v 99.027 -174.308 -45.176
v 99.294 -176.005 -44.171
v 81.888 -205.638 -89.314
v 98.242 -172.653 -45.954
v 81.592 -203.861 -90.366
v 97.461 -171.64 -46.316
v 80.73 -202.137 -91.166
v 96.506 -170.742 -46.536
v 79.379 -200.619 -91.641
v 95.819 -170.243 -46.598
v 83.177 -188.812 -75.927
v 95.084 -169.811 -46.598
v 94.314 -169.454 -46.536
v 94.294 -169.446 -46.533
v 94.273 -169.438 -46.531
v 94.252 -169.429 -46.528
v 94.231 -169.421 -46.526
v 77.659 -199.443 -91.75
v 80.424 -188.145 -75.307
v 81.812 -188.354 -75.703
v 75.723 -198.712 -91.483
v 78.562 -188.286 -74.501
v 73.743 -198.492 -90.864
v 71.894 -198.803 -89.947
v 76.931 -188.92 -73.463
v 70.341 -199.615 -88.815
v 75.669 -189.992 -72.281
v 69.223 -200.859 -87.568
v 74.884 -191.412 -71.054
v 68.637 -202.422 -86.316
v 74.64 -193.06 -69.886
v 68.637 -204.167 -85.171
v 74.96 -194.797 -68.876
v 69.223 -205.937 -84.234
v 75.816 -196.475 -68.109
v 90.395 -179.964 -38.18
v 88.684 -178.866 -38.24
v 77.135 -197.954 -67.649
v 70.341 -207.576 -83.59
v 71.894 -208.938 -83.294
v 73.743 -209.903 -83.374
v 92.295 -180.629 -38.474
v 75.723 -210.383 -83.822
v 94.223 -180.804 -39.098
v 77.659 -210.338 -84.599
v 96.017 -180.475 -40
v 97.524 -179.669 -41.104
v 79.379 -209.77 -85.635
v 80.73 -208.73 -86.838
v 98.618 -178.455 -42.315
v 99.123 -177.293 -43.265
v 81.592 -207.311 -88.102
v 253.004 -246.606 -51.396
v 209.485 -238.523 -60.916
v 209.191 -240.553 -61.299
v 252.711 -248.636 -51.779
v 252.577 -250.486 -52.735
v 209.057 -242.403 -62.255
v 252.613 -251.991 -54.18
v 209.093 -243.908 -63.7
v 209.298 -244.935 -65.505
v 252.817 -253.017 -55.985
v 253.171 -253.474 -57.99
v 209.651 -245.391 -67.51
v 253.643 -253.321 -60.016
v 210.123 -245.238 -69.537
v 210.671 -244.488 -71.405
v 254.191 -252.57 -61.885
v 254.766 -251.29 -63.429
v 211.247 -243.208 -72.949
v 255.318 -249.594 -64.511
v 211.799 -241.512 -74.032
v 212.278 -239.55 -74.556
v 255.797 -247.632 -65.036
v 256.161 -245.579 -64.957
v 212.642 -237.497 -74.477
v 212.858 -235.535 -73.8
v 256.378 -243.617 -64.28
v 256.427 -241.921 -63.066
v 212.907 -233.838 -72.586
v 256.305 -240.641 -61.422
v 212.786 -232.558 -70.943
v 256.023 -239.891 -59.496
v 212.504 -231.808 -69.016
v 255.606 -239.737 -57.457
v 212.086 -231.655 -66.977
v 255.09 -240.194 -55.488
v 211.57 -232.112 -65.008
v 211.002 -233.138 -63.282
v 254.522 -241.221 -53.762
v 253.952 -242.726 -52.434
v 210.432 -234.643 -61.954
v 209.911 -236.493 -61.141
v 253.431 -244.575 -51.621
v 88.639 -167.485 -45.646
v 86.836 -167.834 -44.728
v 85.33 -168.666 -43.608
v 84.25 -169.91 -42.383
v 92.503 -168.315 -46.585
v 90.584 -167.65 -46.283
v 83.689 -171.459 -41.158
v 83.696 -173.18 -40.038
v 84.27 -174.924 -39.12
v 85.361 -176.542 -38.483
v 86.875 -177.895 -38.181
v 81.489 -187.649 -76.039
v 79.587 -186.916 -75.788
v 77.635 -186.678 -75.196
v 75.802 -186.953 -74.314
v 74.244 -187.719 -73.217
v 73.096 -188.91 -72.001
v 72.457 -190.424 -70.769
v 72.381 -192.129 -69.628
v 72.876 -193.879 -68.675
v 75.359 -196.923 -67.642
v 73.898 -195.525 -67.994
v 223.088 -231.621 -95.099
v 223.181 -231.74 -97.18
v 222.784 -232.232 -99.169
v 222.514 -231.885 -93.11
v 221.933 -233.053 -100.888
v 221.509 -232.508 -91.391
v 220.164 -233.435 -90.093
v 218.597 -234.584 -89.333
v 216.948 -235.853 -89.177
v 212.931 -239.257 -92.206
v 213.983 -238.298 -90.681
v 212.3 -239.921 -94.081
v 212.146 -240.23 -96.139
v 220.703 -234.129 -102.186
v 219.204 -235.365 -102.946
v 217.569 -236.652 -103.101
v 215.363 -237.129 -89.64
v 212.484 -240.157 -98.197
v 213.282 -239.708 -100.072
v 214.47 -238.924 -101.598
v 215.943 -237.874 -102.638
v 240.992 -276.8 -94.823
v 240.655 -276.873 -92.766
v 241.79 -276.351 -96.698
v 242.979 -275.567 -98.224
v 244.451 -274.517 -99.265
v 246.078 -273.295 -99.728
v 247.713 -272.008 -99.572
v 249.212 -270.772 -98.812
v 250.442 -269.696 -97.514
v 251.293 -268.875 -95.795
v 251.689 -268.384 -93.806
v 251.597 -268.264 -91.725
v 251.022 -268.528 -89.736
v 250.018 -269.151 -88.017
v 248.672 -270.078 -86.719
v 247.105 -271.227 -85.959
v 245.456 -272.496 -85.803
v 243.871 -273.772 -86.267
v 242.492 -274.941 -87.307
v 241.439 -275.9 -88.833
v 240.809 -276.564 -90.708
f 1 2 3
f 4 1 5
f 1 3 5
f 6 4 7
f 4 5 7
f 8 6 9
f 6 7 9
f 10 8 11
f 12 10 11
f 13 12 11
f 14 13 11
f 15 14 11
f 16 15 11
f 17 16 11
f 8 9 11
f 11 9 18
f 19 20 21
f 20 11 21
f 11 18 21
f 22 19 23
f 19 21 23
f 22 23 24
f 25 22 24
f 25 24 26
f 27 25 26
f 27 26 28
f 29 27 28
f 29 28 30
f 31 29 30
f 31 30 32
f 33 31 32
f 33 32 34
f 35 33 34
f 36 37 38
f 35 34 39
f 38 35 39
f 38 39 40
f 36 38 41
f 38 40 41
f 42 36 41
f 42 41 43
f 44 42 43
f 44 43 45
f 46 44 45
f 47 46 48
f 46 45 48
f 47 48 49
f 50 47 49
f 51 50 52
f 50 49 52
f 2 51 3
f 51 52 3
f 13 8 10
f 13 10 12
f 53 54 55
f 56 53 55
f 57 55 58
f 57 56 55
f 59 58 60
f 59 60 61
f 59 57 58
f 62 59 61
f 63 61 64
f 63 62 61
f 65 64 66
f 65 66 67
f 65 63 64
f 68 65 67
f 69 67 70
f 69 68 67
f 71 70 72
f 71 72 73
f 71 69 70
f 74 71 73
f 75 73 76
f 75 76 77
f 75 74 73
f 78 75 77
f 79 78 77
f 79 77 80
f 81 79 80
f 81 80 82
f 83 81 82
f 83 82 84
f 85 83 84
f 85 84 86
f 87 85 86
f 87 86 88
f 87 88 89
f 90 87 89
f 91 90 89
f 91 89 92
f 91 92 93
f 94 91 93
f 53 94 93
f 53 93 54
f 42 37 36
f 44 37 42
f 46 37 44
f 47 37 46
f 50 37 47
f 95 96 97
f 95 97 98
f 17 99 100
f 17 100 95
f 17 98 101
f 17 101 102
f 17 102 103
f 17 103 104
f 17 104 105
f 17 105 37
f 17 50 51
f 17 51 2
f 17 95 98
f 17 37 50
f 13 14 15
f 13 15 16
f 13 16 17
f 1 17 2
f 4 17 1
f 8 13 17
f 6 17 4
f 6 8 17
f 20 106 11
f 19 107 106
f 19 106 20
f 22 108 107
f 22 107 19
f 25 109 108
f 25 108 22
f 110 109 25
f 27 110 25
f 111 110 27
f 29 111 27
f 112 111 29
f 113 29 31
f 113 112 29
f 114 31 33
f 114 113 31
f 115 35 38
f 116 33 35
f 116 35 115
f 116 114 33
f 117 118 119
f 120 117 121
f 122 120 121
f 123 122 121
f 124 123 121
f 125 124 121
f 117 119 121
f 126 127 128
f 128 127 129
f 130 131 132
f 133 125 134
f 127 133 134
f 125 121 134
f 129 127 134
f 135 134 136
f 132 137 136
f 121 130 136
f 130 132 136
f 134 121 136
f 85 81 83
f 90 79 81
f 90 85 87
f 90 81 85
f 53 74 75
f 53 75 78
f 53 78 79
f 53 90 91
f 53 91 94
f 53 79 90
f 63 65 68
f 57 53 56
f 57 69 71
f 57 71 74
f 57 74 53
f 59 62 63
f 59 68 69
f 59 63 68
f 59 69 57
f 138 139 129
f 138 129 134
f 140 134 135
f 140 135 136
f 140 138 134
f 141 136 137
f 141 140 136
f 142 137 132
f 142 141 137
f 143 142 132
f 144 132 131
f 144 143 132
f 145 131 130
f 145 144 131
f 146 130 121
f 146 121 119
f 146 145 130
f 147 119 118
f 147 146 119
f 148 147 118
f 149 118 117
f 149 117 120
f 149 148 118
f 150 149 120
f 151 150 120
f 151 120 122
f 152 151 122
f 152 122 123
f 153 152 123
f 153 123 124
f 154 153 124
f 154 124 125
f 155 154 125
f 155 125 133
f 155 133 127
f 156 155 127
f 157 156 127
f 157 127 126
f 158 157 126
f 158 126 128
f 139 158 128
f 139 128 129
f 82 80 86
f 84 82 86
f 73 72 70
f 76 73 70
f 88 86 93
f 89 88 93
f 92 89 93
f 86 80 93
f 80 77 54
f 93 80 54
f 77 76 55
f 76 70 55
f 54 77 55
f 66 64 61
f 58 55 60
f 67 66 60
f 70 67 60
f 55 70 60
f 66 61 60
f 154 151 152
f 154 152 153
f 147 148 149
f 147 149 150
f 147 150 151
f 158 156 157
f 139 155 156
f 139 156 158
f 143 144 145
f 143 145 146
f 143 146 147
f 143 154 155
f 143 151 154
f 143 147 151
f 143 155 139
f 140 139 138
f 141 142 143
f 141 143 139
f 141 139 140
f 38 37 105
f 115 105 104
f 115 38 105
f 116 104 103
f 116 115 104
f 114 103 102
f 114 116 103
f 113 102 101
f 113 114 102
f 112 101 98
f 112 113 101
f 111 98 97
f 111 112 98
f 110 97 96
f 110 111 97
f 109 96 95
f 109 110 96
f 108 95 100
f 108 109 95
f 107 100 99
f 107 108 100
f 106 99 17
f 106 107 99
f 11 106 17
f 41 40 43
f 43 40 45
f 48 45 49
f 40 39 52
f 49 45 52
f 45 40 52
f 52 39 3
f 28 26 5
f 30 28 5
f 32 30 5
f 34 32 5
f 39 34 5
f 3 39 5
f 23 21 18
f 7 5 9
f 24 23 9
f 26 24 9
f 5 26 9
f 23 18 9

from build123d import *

# Parameters (mm, degrees)
SUSP_FR_ROCKER_BRACKET_A_PROFILE_R     = 7
SUSP_FR_ROCKER_BRACKET_B_PROFILE_R     = 7
SUSP_FR_COILOVER_BRACKET_A_PROFILE_R   = 7
SUSP_FR_COILOVER_BRACKET_B_START       = -153.343858877
SUSP_FR_COILOVER_BRACKET_B_OUTLINE_R   = 7
SUSP_FR_COILOVER_BRACKET_B_DEPTH       = 56.748118524
SUSP_FR_COILOVER_BRACKET_B_START_2     = -96.439698882
SUSP_FR_COILOVER_BRACKET_B_2_OUTLINE_W = 17
SUSP_FR_COILOVER_BRACKET_B_2_OUTLINE_H = 17
SUSP_FR_COILOVER_BRACKET_B_2_DEPTH     = 1.439698882


with BuildPart() as part:
    # SUSP_FR_rocker_bracket_a: sweep along a curve in space
    with BuildLine() as susp_fr_rocker_bracket_a_path:
        Line((210.980497, -238.523155, -67.7546604), (254.500188, -246.605638, -58.2344508))
    # SUSP_FR_rocker_bracket_a profile (on start of the path) → SUSP_FR_rocker_bracket_a (sweep)
    with BuildSketch(Plane(origin=(210.980497, -238.523155, -67.7546604), x_dir=(-0.21370281690009318, 0, 0.9768987184191438), z_dir=(0.9612068958359004, -0.17851547693839223, 0.2102701307627194))):
        Circle(SUSP_FR_ROCKER_BRACKET_A_PROFILE_R)
    sweep(path=susp_fr_rocker_bracket_a_path.line)


with BuildPart() as body_2:
    # SUSP_FR_rocker_bracket_b: sweep along a curve in space
    with BuildLine() as susp_fr_rocker_bracket_b_path:
        Line((217.671213, -235.931172, -96.1393535), (246.179812, -272.574362, -92.7655492))
    # SUSP_FR_rocker_bracket_b profile (on start of the path) → SUSP_FR_rocker_bracket_b (sweep)
    with BuildSketch(Plane(origin=(217.671213, -235.931172, -96.1393535), x_dir=(-0.7892651534447245, -0.614052536480288, 0), z_dir=(0.6124375878865993, -0.7871893984011755, 0.07247794139211926))):
        Circle(SUSP_FR_ROCKER_BRACKET_B_PROFILE_R)
    sweep(path=susp_fr_rocker_bracket_b_path.line)


with BuildPart() as body_3:
    # SUSP_FR_coilover_bracket_a: sweep along a curve in space
    with BuildLine() as susp_fr_coilover_bracket_a_path:
        Line((90.2859184, -173.45527, -42.383), (79.0072944, -192.655717, -71.8225231))
    # SUSP_FR_coilover_bracket_a profile (on start of the path) → SUSP_FR_coilover_bracket_a (sweep)
    with BuildSketch(Plane(origin=(90.2859184, -173.45527, -42.383), x_dir=(0, -0.8376007285532237, 0.546282911619162), z_dir=(-0.3055483110770024, -0.5201577916573424, -0.7975437927638508))):
        Circle(SUSP_FR_COILOVER_BRACKET_A_PROFILE_R)
    sweep(path=susp_fr_coilover_bracket_a_path.line)

    # SUSP_FR_coilover_bracket_b: read off the stored shape, not the designer's step
    # SUSP_FR_coilover_bracket_b outline → SUSP_FR_coilover_bracket_b (add)
    with BuildSketch(Plane(origin=(0, 0, 0), x_dir=(0.9517732897377809, -0.16835993398862525, -0.2564810666873248), z_dir=(0.30680222447322997, 0.5222924589530519, 0.7956651194937808)).offset(SUSP_FR_COILOVER_BRACKET_B_START)):
        with Locations((128.467087626, -122.898172142)):
            Circle(SUSP_FR_COILOVER_BRACKET_B_OUTLINE_R)
    extrude(amount=SUSP_FR_COILOVER_BRACKET_B_DEPTH)

    # SUSP_FR_coilover_bracket_b 2 outline → SUSP_FR_coilover_bracket_b 2 (cut)
    with BuildSketch(Plane(origin=(0, 0, 0), x_dir=(0.9521765748000688, -0.16691582101546293, -0.25592748796630466), z_dir=(0.3055483110770031, 0.5201577916573431, 0.7975437927638501)).offset(SUSP_FR_COILOVER_BRACKET_B_START_2)):
        with Locations((128.5, -123.5)):
            Rectangle(SUSP_FR_COILOVER_BRACKET_B_2_OUTLINE_W, SUSP_FR_COILOVER_BRACKET_B_2_OUTLINE_H)
    extrude(amount=SUSP_FR_COILOVER_BRACKET_B_2_DEPTH, mode=Mode.SUBTRACT)


solid = Compound([part.part, body_2.part, body_3.part])
